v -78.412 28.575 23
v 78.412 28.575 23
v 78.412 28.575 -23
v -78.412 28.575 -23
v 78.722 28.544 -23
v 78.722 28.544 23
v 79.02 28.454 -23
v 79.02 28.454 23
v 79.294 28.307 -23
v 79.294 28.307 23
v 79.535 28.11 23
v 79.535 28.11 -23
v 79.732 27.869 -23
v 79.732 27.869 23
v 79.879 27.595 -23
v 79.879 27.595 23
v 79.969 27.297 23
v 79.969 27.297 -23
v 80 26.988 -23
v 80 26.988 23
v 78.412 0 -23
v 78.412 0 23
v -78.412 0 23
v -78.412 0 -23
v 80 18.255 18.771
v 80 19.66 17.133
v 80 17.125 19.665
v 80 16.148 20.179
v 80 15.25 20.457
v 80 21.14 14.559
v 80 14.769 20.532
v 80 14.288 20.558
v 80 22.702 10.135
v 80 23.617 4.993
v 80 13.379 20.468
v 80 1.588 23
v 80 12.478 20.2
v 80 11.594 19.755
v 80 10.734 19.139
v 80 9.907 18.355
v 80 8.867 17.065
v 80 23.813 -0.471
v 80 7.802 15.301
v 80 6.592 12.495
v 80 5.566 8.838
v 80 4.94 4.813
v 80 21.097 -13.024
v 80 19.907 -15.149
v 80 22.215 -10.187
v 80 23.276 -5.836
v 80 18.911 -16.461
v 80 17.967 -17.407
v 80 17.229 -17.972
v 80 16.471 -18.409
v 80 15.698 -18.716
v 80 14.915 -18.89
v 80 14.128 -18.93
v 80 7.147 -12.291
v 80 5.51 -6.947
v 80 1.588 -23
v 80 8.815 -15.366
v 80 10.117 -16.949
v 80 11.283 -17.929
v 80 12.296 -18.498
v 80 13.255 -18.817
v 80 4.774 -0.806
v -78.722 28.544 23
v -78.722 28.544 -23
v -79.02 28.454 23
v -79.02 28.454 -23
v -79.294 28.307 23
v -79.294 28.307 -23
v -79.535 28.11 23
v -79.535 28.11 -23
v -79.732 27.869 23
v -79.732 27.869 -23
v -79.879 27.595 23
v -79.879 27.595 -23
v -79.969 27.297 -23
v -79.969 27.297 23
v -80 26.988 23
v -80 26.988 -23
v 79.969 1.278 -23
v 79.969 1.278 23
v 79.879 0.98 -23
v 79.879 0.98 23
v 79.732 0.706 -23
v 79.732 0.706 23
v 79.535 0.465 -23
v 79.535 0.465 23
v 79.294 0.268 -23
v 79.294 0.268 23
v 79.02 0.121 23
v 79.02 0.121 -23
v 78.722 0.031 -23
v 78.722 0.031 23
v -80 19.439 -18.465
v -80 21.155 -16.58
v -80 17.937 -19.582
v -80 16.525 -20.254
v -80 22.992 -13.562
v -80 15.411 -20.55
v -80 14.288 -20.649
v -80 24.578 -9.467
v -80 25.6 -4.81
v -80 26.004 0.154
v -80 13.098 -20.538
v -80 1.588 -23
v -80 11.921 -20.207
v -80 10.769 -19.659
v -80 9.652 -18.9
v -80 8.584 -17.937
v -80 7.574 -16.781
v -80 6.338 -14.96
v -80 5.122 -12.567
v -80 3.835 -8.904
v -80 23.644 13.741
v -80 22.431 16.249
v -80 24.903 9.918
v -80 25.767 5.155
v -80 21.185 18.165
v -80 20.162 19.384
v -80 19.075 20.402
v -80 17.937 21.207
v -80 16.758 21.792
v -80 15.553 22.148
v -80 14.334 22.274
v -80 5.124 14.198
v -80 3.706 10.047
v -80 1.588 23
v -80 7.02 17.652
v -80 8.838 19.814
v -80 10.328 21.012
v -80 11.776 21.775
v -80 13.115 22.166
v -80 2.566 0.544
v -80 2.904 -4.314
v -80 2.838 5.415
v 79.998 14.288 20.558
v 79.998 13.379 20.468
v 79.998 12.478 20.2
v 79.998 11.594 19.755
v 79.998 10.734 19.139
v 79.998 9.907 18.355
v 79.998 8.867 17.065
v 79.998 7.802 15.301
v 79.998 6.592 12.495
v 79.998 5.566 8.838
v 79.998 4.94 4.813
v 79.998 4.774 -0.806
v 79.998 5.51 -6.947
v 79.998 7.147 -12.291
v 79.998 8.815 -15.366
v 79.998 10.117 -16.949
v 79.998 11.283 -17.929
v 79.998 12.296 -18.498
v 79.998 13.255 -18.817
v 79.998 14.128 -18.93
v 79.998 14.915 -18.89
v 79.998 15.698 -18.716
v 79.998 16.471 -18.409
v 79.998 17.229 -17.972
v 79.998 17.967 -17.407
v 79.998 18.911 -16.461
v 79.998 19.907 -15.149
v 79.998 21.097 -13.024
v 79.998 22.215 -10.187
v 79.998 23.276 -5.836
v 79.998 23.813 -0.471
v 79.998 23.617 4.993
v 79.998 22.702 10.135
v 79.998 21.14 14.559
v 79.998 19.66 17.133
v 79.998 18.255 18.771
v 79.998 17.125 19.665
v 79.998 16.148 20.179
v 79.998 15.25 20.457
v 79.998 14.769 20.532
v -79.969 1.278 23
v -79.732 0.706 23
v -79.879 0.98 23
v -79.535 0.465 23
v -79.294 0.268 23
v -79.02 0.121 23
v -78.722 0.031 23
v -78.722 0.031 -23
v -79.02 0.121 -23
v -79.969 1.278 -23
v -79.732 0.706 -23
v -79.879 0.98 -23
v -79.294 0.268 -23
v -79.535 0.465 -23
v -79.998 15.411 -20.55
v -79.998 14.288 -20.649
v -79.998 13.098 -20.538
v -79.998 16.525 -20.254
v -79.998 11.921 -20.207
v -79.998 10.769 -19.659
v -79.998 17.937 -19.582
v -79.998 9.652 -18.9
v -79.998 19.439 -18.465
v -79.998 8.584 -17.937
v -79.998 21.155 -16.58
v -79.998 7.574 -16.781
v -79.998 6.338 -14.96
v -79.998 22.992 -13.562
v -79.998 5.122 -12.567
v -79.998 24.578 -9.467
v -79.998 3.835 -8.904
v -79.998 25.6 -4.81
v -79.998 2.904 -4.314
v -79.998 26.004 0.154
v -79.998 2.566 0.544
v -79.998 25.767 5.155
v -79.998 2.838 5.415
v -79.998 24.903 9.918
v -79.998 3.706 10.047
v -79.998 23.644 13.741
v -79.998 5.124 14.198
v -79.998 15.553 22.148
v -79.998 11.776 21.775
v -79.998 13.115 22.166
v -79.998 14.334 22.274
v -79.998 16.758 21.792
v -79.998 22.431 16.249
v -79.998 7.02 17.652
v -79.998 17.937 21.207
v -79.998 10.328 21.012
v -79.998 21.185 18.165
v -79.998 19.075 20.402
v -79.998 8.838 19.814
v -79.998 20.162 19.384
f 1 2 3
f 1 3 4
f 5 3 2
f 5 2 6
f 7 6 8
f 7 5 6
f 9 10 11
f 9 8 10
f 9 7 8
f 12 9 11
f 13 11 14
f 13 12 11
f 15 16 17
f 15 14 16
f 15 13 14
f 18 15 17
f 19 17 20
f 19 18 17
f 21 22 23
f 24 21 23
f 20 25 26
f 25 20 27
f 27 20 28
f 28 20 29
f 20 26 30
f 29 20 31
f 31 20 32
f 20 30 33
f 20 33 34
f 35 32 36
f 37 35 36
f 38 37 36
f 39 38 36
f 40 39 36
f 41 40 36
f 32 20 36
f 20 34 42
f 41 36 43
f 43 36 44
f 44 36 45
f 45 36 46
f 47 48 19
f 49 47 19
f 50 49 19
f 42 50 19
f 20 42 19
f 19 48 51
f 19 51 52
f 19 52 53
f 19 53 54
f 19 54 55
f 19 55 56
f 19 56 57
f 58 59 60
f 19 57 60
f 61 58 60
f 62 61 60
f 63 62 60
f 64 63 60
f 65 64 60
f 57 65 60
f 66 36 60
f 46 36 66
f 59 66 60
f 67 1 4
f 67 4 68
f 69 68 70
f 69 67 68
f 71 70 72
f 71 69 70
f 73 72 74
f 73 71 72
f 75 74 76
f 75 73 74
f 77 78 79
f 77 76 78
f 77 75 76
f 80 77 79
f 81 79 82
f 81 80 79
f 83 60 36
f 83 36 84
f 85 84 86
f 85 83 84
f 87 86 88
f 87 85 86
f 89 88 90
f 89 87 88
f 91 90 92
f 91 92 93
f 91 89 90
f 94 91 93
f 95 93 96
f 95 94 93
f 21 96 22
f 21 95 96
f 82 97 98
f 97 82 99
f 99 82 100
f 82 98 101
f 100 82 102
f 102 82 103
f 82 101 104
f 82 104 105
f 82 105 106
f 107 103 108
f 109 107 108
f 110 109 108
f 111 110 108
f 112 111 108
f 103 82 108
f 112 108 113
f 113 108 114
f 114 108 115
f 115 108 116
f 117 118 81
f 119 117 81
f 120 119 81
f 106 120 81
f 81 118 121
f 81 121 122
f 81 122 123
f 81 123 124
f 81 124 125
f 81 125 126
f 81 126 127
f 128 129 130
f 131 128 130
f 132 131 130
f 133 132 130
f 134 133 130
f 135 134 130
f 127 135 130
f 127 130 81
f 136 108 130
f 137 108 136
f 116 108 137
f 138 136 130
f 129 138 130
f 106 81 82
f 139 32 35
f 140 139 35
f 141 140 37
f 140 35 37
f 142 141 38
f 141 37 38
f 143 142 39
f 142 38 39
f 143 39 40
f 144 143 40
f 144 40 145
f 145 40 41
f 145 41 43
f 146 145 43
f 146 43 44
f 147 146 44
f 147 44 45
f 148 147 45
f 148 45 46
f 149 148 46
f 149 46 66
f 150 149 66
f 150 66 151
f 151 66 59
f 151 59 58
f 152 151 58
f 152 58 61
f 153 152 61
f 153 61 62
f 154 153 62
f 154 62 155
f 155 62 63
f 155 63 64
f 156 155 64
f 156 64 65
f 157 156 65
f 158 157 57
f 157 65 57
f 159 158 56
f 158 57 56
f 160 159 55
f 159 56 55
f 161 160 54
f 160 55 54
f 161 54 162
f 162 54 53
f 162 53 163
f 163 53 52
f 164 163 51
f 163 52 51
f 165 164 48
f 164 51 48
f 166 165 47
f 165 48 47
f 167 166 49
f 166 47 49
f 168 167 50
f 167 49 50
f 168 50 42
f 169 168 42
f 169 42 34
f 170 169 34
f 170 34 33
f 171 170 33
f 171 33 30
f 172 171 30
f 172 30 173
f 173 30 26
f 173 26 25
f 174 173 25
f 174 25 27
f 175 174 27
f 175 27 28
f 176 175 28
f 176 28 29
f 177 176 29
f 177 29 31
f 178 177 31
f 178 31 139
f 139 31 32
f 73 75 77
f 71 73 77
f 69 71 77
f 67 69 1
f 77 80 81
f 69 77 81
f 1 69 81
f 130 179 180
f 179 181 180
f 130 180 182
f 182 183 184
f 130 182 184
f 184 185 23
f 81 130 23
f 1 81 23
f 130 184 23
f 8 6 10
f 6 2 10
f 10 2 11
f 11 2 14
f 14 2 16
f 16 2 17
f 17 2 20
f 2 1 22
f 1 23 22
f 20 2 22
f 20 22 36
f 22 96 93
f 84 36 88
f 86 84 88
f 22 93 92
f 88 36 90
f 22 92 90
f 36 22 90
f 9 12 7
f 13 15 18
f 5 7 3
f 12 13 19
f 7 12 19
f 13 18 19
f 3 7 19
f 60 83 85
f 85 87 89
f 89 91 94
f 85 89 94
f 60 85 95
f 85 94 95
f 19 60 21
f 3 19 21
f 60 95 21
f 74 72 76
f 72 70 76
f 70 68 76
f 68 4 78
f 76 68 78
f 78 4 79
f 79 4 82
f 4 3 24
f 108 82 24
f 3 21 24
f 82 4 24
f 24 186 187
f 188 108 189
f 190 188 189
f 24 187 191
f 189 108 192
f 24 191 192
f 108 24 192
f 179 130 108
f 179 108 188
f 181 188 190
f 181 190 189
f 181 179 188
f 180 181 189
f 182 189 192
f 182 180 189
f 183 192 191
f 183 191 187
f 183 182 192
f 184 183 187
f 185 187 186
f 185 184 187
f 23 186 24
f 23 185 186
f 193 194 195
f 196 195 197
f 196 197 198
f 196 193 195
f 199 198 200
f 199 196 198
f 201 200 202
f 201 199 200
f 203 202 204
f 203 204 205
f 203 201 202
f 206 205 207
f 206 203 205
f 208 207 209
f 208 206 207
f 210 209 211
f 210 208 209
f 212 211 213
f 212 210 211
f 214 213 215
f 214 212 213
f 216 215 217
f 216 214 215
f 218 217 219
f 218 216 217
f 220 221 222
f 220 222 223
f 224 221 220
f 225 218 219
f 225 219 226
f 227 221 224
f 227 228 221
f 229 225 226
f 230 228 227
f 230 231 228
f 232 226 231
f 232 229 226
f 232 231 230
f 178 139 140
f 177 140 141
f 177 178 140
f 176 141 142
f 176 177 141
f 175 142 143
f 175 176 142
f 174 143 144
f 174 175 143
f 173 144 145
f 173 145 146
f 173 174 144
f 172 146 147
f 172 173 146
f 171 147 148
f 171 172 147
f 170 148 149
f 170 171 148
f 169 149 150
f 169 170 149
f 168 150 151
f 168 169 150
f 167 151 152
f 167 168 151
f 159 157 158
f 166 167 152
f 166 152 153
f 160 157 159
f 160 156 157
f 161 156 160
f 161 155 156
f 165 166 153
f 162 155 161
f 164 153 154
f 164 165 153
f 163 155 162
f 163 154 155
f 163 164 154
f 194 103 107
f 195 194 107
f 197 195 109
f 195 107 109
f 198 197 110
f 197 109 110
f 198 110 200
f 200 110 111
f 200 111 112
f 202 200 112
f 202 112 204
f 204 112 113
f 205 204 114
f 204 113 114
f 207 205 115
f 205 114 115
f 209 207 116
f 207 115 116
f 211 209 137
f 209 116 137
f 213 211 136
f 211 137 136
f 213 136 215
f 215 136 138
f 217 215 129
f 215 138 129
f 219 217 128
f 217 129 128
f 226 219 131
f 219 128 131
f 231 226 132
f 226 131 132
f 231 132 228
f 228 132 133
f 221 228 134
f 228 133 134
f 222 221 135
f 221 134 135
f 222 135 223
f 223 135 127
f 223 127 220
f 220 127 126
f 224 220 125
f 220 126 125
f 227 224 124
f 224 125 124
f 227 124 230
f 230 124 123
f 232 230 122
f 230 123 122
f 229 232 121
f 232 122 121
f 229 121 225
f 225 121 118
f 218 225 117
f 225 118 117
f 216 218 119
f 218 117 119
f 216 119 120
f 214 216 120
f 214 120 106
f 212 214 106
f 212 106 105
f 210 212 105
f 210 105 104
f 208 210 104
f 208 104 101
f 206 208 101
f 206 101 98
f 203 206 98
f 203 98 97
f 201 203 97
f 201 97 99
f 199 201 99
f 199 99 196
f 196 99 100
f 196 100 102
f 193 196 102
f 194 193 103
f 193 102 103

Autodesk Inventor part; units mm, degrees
ref_plane "YZ Plane" through (0, 0, 0) normal (1, 0, 0) x (0, 1, 0)
ref_plane "XZ Plane" through (0, 0, 0) normal (0, 1, 0) x (-1, 0, 0)
ref_plane "XY Plane" through (0, 0, 0) normal (0, 0, 1) x (1, 0, 0)
sketch "Sketch1" plane through (0, 0, 0) normal (0, 1, 0) x (-1, 0, 0)
  line L0 (80, 23) -> (-80, 23)
  line L1 (-80, 23) -> (-80, -23)
  line L2 (-80, -23) -> (80, -23)
  line L3 (80, -23) -> (80, 23)
  point P0 (0, 0)
  point P1 (80, 0)
  point P2 (0, -23)
  dimension "d0" = 159.9999
  dimension "d1" = 45.9999
extrude "Extrusion1" add sketch "Sketch1" along normal blind 28.575
fillet "Fillet1" radius 1.5875 4 edges at (80, 28.575, 0) (80, 0, 0) (-80, 0, 0) (-80, 28.575, 0)
sketch "Sketch2" plane through (80, 1.5875, -23) normal (1, 0, 0) x (0, 0, -1)
  line L0 (0, 0) -> (-45.9999, 0) projected
  line L1 (0, 0) -> (0, 25.4) projected
  line L2 (-45.9999, 25.4) -> (0, 25.4) projected
  line L3 (-45.9999, 0) -> (-45.9999, 25.4) projected
  ellipse E0 centre (-23.8125, 12.7) end of major axis (-43.5575, 12.7) minor radius 9.5456
  point P0 (-23, -1.5875)
sketch "Sketch3" plane through (-80, 1.5875, -23) normal (-1, 0, 0) x (0, 0, 1)
  line L0 (0, 25.4) -> (45.9999, 25.4) projected
  line L1 (0, 0) -> (0, 25.4) projected
  line L2 (45.9999, 0) -> (0, 0) projected
  line L3 (45.9999, 0) -> (45.9999, 25.4) projected
  ellipse E0 centre (23.8125, 12.7) end of major axis (2.3512, 12.7) minor radius 11.7224
  point P0 (23, -1.5875)
extrude "Extrusion2" cut sketch "Sketch2" against normal blind 0.0025 contours E0
extrude "Extrusion3" cut sketch "Sketch3" against normal blind 0.0025 contours E0
properties part number "Turnigy 4S 5200 mah" material "Типовой"
